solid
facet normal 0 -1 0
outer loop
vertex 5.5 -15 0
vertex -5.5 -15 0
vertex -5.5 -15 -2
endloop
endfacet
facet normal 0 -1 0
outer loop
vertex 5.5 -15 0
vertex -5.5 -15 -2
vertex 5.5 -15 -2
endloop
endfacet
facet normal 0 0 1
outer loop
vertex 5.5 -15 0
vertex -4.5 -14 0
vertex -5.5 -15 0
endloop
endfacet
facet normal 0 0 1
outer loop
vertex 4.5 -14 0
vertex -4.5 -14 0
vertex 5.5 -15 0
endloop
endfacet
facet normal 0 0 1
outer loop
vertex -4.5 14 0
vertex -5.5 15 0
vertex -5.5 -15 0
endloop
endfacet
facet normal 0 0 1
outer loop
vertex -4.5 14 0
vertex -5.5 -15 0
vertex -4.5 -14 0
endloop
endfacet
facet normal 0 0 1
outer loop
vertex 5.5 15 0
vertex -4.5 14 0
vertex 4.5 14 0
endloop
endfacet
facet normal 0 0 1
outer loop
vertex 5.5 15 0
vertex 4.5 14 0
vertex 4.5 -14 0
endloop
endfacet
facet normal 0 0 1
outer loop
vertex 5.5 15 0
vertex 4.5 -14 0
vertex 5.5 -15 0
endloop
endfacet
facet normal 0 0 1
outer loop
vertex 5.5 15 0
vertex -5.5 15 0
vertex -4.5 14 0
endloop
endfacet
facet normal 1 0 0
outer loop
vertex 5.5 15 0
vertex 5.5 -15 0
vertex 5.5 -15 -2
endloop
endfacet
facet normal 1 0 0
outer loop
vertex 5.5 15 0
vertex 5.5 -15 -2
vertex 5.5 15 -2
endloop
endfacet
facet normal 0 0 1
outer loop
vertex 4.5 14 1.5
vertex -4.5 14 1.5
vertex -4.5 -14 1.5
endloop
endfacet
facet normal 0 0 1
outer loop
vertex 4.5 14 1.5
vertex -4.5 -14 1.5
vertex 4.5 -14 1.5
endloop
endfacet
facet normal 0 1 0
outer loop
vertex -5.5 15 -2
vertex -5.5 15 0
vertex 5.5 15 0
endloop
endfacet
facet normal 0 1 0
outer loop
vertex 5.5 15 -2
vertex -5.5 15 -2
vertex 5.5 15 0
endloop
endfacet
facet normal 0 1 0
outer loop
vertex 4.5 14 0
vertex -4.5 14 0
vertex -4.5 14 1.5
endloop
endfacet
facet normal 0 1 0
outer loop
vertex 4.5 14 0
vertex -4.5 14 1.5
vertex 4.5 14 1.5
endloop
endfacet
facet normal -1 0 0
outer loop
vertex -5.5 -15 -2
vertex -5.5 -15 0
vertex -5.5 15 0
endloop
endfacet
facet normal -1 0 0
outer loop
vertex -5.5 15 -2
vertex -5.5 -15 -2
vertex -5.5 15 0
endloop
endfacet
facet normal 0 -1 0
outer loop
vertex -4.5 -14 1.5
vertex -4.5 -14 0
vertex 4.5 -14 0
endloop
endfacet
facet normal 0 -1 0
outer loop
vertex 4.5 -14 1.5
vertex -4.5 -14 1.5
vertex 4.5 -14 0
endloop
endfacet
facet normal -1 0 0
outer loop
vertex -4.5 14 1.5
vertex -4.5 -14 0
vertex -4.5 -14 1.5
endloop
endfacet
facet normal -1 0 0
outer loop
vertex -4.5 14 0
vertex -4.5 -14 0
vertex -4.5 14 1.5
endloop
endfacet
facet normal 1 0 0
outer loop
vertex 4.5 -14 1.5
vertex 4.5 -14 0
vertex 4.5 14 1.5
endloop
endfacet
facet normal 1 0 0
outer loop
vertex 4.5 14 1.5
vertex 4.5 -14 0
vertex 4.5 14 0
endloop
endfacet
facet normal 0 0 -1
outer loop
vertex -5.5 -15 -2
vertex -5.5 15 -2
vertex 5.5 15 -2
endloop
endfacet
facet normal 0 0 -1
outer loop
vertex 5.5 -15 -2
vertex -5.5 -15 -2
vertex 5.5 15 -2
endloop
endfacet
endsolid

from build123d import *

# Parameters (mm, degrees)
F0_W     = 11
F0_H     = 30
F0_W_2   = 9
F0_H_2   = 28
F1_DEPTH = 2
F2_W     = 9
F2_H     = 28
F3_DEPTH = 1.5


with BuildPart() as f1:
    # F0 (on Top) → F1 (new body)
    with BuildSketch(Plane.XY):
        Rectangle(F0_W, F0_H)
        Rectangle(F0_W_2, F0_H_2, mode=Mode.SUBTRACT)
        Rectangle(F0_W_2, F0_H_2)
    extrude(amount=-F1_DEPTH)

    # F2 (on face) → F3 (join)
    with BuildSketch(Plane.XY):
        Rectangle(F2_W, F2_H)
    extrude(amount=F3_DEPTH)


solid = f1.part
